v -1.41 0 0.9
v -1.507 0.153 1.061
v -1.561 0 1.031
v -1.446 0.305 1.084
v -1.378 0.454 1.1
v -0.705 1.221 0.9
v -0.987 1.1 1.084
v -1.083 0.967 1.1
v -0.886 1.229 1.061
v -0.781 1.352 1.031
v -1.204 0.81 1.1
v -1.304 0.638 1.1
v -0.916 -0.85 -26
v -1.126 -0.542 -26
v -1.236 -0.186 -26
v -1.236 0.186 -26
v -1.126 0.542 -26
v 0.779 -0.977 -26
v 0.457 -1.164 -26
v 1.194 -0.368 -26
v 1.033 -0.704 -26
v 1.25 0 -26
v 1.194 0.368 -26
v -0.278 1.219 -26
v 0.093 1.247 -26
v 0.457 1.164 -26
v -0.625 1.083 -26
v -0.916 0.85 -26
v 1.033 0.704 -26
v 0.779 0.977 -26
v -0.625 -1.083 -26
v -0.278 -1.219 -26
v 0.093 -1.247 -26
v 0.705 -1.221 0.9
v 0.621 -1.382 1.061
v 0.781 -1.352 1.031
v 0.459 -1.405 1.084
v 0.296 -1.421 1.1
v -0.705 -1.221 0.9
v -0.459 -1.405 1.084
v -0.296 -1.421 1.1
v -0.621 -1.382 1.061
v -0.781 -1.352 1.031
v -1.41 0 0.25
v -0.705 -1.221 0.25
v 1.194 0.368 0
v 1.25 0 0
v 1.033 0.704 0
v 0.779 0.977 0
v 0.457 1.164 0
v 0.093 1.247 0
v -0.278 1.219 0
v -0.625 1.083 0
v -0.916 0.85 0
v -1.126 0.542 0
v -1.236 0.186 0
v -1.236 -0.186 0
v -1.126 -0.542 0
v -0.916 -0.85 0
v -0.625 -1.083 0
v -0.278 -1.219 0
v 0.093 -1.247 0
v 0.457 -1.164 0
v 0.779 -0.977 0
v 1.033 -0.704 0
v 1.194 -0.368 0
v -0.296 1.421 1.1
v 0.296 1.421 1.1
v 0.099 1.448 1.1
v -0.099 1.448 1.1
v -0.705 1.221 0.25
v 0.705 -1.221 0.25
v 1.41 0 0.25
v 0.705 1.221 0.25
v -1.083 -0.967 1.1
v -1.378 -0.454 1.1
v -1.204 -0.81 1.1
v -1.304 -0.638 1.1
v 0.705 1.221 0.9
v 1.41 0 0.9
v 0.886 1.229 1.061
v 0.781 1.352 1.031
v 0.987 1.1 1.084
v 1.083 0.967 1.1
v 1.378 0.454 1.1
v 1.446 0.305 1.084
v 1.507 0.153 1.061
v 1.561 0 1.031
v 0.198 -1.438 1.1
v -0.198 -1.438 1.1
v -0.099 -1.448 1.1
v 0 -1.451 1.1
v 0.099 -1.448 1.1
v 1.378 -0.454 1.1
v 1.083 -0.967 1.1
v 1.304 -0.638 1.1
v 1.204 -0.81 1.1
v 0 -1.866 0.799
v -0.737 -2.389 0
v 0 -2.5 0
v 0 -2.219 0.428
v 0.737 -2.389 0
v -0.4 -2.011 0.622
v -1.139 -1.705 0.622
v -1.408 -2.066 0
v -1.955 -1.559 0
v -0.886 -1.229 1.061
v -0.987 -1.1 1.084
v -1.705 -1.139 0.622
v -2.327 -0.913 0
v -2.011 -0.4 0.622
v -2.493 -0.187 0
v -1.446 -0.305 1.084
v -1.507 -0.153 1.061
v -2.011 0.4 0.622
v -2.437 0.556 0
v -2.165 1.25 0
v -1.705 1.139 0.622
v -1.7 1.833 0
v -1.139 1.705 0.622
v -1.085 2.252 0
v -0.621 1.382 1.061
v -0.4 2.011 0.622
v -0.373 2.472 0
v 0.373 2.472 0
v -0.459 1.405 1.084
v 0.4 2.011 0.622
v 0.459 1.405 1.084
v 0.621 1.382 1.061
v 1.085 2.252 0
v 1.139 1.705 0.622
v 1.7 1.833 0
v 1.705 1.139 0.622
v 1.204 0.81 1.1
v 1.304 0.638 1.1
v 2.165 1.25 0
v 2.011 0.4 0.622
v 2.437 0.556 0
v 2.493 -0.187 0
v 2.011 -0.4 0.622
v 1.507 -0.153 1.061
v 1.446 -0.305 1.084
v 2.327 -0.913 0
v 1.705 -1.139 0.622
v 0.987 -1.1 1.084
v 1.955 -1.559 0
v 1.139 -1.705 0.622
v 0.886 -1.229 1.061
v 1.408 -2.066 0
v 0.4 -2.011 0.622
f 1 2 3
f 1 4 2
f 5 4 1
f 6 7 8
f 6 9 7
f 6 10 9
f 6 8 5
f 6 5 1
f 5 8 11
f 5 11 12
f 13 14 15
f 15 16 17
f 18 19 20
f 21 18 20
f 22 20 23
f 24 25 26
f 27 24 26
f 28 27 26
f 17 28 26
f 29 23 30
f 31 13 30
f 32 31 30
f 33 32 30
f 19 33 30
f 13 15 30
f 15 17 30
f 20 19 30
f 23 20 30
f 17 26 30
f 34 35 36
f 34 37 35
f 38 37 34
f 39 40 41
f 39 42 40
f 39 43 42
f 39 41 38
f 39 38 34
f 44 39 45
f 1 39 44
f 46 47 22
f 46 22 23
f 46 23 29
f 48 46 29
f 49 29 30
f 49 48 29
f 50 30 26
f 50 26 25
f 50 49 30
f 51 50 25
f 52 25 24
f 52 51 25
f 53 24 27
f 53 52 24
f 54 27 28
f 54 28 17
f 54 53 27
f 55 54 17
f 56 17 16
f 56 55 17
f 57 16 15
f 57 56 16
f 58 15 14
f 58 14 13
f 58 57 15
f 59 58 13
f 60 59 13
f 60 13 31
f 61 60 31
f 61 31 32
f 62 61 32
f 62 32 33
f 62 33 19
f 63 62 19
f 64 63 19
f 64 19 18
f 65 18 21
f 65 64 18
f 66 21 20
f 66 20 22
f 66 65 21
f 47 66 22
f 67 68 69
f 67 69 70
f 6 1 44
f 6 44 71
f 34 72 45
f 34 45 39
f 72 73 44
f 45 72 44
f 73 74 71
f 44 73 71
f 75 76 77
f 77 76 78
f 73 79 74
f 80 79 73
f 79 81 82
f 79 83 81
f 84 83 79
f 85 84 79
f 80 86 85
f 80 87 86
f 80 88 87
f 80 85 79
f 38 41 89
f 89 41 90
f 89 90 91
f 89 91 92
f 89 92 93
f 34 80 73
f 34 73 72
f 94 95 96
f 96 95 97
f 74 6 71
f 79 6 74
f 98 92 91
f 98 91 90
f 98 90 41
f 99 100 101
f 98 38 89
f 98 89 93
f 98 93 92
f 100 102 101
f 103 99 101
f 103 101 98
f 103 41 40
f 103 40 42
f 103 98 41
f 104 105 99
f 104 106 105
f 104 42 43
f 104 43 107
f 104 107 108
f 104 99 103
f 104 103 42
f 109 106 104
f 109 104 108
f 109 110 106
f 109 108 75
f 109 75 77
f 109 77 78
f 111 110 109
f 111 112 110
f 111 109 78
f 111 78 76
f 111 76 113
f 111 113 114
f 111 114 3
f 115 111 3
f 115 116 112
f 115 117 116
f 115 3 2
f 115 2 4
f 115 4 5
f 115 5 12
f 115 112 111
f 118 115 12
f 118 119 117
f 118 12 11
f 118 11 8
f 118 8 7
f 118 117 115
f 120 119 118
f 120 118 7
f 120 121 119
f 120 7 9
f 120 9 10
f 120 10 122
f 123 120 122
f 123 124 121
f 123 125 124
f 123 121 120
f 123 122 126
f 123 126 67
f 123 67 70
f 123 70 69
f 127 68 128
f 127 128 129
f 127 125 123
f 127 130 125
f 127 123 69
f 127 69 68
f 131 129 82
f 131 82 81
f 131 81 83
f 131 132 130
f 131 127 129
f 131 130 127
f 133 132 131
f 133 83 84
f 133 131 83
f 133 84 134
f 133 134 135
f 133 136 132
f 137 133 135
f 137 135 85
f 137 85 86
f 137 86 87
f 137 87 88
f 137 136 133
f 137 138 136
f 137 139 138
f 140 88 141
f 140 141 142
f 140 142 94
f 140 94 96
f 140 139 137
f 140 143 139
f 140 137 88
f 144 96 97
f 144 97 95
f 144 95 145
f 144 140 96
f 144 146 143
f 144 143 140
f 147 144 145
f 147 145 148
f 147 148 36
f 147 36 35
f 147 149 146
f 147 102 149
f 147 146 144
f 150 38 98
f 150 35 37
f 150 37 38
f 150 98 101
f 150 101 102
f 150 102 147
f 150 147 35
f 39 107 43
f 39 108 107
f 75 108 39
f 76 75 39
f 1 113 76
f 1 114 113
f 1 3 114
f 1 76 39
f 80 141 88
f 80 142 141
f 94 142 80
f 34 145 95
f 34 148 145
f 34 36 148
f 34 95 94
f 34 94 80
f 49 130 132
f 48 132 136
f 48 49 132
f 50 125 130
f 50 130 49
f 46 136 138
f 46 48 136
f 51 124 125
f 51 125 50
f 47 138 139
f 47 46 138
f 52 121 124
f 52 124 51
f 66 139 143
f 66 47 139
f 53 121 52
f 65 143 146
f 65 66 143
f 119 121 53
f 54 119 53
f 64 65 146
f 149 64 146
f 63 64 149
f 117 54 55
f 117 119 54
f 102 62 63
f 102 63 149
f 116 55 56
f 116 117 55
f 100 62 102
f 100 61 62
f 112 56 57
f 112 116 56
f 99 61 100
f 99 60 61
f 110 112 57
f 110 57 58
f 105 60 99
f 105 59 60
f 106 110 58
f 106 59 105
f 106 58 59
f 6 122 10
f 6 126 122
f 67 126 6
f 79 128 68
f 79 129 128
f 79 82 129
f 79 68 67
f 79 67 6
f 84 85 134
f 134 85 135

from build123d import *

# Parameters (mm, degrees)
SKETCH1_R               = 1.25
BOSS_EXTRUDE1_DEPTH     = 26
CUT_EXTRUDE1_DEPTH      = 1.25
CUT_EXTRUDE2_DEPTH      = 27.239283527
CUT_EXTRUDE2_DEPTH_BACK = 27.239283527
SKETCH6_W               = 1.249656436
SKETCH6_H               = 4.384153796
CHAMFER2_SIZE           = 0.2


with BuildPart() as part:
    # Sketch1 → Boss-Extrude1 (new body)
    with BuildSketch(Plane.XY):
        Circle(SKETCH1_R)
    extrude(amount=-BOSS_EXTRUDE1_DEPTH)

    # Sketch3 → Revolve1 (revolve)
    with BuildSketch(Plane(origin=(0, 0, 0), x_dir=(0, 0, -1), z_dir=(1, 0, 0)), mode=Mode.PRIVATE) as revolve1_sk:
        with BuildLine():
            ThreePointArc((-1.5, 0), (-1.096229956, 1.457737974), (0, 2.5))
            Line((0, 2.5), (0, 0))
            Line((0, 0), (-1.5, 0))
        make_face()
    revolve(revolve1_sk.sketch.rotate(Axis((0, 0, 1.5), (0, 0, -1)), 180), axis=Axis((0, 0, 1.5), (0, 0, -1)))

    # Sketch5 → Cut-Extrude1 (cut)
    with BuildSketch(Plane(origin=(0, 0, 1.5), x_dir=(-1, 0, 0), z_dir=(0, 0, -1))):
        Polygon((-1.409901945, 0), (-0.704950973, -1.221010901), (0.704950973, -1.221010901), (1.409901945, 0), (0.704950973, 1.221010901), (-0.704950973, 1.221010901), align=None)
    extrude(amount=CUT_EXTRUDE1_DEPTH, mode=Mode.SUBTRACT)

    # Sketch6 → Cut-Extrude2 (cut, two sides: drawn at the far end of the back side and taken through both)
    with BuildSketch(Plane(origin=(0, 0, 0), x_dir=(0, 0, -1), z_dir=(1, 0, 0)).offset(-CUT_EXTRUDE2_DEPTH_BACK)):
        with Locations((-1.724828218, 0.205450463)):
            Rectangle(SKETCH6_W, SKETCH6_H)
    extrude(amount=CUT_EXTRUDE2_DEPTH + CUT_EXTRUDE2_DEPTH_BACK, mode=Mode.SUBTRACT)

    # Chamfer2
    # the kernel refuses this chamfer: 0.2 mm, written as the material it takes off along each edge
    with BuildSketch(Plane(origin=(1.21928757, 1.221010901, 1.1), x_dir=(1.0390370186618431e-14, 0.9996219169112966, 0.02749587661058733), z_dir=(-1, 0, 0))) as chamfer2_piece_1_section:
        Polygon((CHAMFER2_SIZE * 0.999621916911, CHAMFER2_SIZE * 0.0274958766106), (-CHAMFER2_SIZE * 0.0274958766106, CHAMFER2_SIZE * 0.999621916911), (0, 0), align=None)
    chamfer2_piece_1 = extrude(amount=2.43857514, mode=Mode.PRIVATE)
    chamfer2_piece_1 = split(chamfer2_piece_1, bisect_by=Plane(origin=(0.501104512, 1.574083329, 1.032865614), z_dir=(-0.8660254037844416, -0.49999999999999495, 0)), keep=Keep.TOP, mode=Mode.PRIVATE)
    chamfer2_piece_1 = split(chamfer2_piece_1, bisect_by=Plane(origin=(-0.501104512, 1.574083329, 1.032865614), z_dir=(0.8660254037844347, -0.500000000000007, 0)), keep=Keep.TOP, mode=Mode.PRIVATE)
    add(chamfer2_piece_1, mode=Mode.SUBTRACT)
    with BuildSketch(Plane(origin=(1.667070244, -0.44542856, 1.1), x_dir=(0.8656979742248833, 0.4998109584556433, 0.027495876610586282), z_dir=(-0.49999999999999495, 0.8660254037844416, 0))) as chamfer2_piece_2_section:
        Polygon((CHAMFER2_SIZE * 0.999621916911, CHAMFER2_SIZE * 0.0274958766106), (-CHAMFER2_SIZE * 0.0274958766106, CHAMFER2_SIZE * 0.999621916911), (0, 0), align=None)
    chamfer2_piece_2 = extrude(amount=2.43857514, mode=Mode.PRIVATE)
    chamfer2_piece_2 = split(chamfer2_piece_2, bisect_by=Plane(origin=(1.613748406, 0.353072427, 1.032865614), z_dir=(-0.8660254037844382, 0.500000000000001, 0)), keep=Keep.TOP, mode=Mode.PRIVATE)
    chamfer2_piece_2 = split(chamfer2_piece_2, bisect_by=Plane(origin=(1.112643894, 1.221010901, 1.032865614), z_dir=(0, -1, 0)), keep=Keep.TOP, mode=Mode.PRIVATE)
    add(chamfer2_piece_2, mode=Mode.SUBTRACT)
    with BuildSketch(Plane(origin=(0.447782674, -1.666439461, 1.1), x_dir=(0.8656979742248797, -0.4998109584556493, 0.02749587661058626), z_dir=(0.500000000000001, 0.8660254037844382, 0))) as chamfer2_piece_3_section:
        Polygon((CHAMFER2_SIZE * 0.999621916911, CHAMFER2_SIZE * 0.0274958766106), (-CHAMFER2_SIZE * 0.0274958766106, CHAMFER2_SIZE * 0.999621916911), (0, 0), align=None)
    chamfer2_piece_3 = extrude(amount=2.43857514, mode=Mode.PRIVATE)
    chamfer2_piece_3 = split(chamfer2_piece_3, bisect_by=Plane(origin=(1.112643894, -1.221010901, 1.032865614), z_dir=(0, 1, 0)), keep=Keep.TOP, mode=Mode.PRIVATE)
    chamfer2_piece_3 = split(chamfer2_piece_3, bisect_by=Plane(origin=(1.613748406, -0.353072427, 1.032865614), z_dir=(-0.8660254037844416, -0.49999999999999495, 0)), keep=Keep.TOP, mode=Mode.PRIVATE)
    add(chamfer2_piece_3, mode=Mode.SUBTRACT)
    with BuildSketch(Plane(origin=(-1.21928757, -1.221010901, 1.1), x_dir=(-3.30602687756041e-15, -0.9996219169112968, 0.027495876610586285), z_dir=(1, 0, 0))) as chamfer2_piece_4_section:
        Polygon((CHAMFER2_SIZE * 0.999621916911, CHAMFER2_SIZE * 0.0274958766106), (-CHAMFER2_SIZE * 0.0274958766106, CHAMFER2_SIZE * 0.999621916911), (0, 0), align=None)
    chamfer2_piece_4 = extrude(amount=2.43857514, mode=Mode.PRIVATE)
    chamfer2_piece_4 = split(chamfer2_piece_4, bisect_by=Plane(origin=(-0.501104512, -1.574083329, 1.032865614), z_dir=(0.8660254037844417, 0.49999999999999484, 0)), keep=Keep.TOP, mode=Mode.PRIVATE)
    chamfer2_piece_4 = split(chamfer2_piece_4, bisect_by=Plane(origin=(0.501104512, -1.574083329, 1.032865614), z_dir=(-0.8660254037844382, 0.500000000000001, 0)), keep=Keep.TOP, mode=Mode.PRIVATE)
    add(chamfer2_piece_4, mode=Mode.SUBTRACT)
    with BuildSketch(Plane(origin=(-1.667070244, 0.44542856, 1.1), x_dir=(-0.8656979742248834, -0.4998109584556432, 0.027495876610586265), z_dir=(0.49999999999999484, -0.8660254037844417, 0))) as chamfer2_piece_5_section:
        Polygon((CHAMFER2_SIZE * 0.999621916911, CHAMFER2_SIZE * 0.0274958766106), (-CHAMFER2_SIZE * 0.0274958766106, CHAMFER2_SIZE * 0.999621916911), (0, 0), align=None)
    chamfer2_piece_5 = extrude(amount=2.43857514, mode=Mode.PRIVATE)
    chamfer2_piece_5 = split(chamfer2_piece_5, bisect_by=Plane(origin=(-1.112643894, -1.221010901, 1.032865614), z_dir=(0, 1, 0)), keep=Keep.TOP, mode=Mode.PRIVATE)
    chamfer2_piece_5 = split(chamfer2_piece_5, bisect_by=Plane(origin=(-1.613748406, -0.353072427, 1.032865614), z_dir=(0.8660254037844347, -0.500000000000007, 0)), keep=Keep.TOP, mode=Mode.PRIVATE)
    add(chamfer2_piece_5, mode=Mode.SUBTRACT)
    with BuildSketch(Plane(origin=(-0.447782674, 1.666439461, 1.1), x_dir=(-0.8656979742248764, 0.4998109584556554, 0.027495876610586265), z_dir=(-0.500000000000007, -0.8660254037844347, 0))) as chamfer2_piece_6_section:
        Polygon((CHAMFER2_SIZE * 0.999621916911, CHAMFER2_SIZE * 0.0274958766106), (-CHAMFER2_SIZE * 0.0274958766106, CHAMFER2_SIZE * 0.999621916911), (0, 0), align=None)
    chamfer2_piece_6 = extrude(amount=2.43857514, mode=Mode.PRIVATE)
    chamfer2_piece_6 = split(chamfer2_piece_6, bisect_by=Plane(origin=(-1.112643894, 1.221010901, 1.032865614), z_dir=(0, -1, 0)), keep=Keep.TOP, mode=Mode.PRIVATE)
    chamfer2_piece_6 = split(chamfer2_piece_6, bisect_by=Plane(origin=(-1.613748406, 0.353072427, 1.032865614), z_dir=(0.8660254037844417, 0.49999999999999484, 0)), keep=Keep.TOP, mode=Mode.PRIVATE)
    add(chamfer2_piece_6, mode=Mode.SUBTRACT)
    with BuildSketch(Plane(origin=(1.667070244, -0.44542856, 1.1), x_dir=(0.8656979742248833, 0.4998109584556433, 0.027495876610586282), z_dir=(-0.49999999999999495, 0.8660254037844416, 0))) as chamfer2_piece_7a_section:
        Polygon((CHAMFER2_SIZE * 0.999621916911, CHAMFER2_SIZE * 0.0274958766106), (-CHAMFER2_SIZE * 0.0274958766106, CHAMFER2_SIZE * 0.999621916911), (0, 0), align=None)
    chamfer2_piece_7a = extrude(amount=2.43857514, mode=Mode.PRIVATE)
    chamfer2_piece_7a = split(chamfer2_piece_7a, bisect_by=Plane(origin=(0.645691333, 1.221010901, 1.035460513), z_dir=(0, 1, 0)), keep=Keep.TOP, mode=Mode.PRIVATE)
    with BuildSketch(Plane(origin=(1.21928757, 1.221010901, 1.1), x_dir=(1.0390370186618431e-14, 0.9996219169112966, 0.02749587661058733), z_dir=(-1, 0, 0))) as chamfer2_piece_7b_section:
        Polygon((CHAMFER2_SIZE * 0.999621916911, CHAMFER2_SIZE * 0.0274958766106), (-CHAMFER2_SIZE * 0.0274958766106, CHAMFER2_SIZE * 0.999621916911), (0, 0), align=None)
    chamfer2_piece_7b = extrude(amount=2.43857514, mode=Mode.PRIVATE)
    chamfer2_piece_7b = split(chamfer2_piece_7b, bisect_by=Plane(origin=(0.734580793, 1.169690548, 1.035460513), z_dir=(0.8660254037844416, 0.49999999999999495, 0)), keep=Keep.TOP, mode=Mode.PRIVATE)
    chamfer2_piece_7 = chamfer2_piece_7a & chamfer2_piece_7b
    add(chamfer2_piece_7, mode=Mode.SUBTRACT)
    with BuildSketch(Plane(origin=(1.21928757, 1.221010901, 1.1), x_dir=(1.0390370186618431e-14, 0.9996219169112966, 0.02749587661058733), z_dir=(-1, 0, 0))) as chamfer2_piece_8a_section:
        Polygon((CHAMFER2_SIZE * 0.999621916911, CHAMFER2_SIZE * 0.0274958766106), (-CHAMFER2_SIZE * 0.0274958766106, CHAMFER2_SIZE * 0.999621916911), (0, 0), align=None)
    chamfer2_piece_8a = extrude(amount=2.43857514, mode=Mode.PRIVATE)
    chamfer2_piece_8a = split(chamfer2_piece_8a, bisect_by=Plane(origin=(-0.734580793, 1.169690548, 1.035460513), z_dir=(-0.8660254037844347, 0.500000000000007, 0)), keep=Keep.TOP, mode=Mode.PRIVATE)
    with BuildSketch(Plane(origin=(-0.447782674, 1.666439461, 1.1), x_dir=(-0.8656979742248764, 0.4998109584556554, 0.027495876610586265), z_dir=(-0.500000000000007, -0.8660254037844347, 0))) as chamfer2_piece_8b_section:
        Polygon((CHAMFER2_SIZE * 0.999621916911, CHAMFER2_SIZE * 0.0274958766106), (-CHAMFER2_SIZE * 0.0274958766106, CHAMFER2_SIZE * 0.999621916911), (0, 0), align=None)
    chamfer2_piece_8b = extrude(amount=2.43857514, mode=Mode.PRIVATE)
    chamfer2_piece_8b = split(chamfer2_piece_8b, bisect_by=Plane(origin=(-0.645691333, 1.221010901, 1.035460513), z_dir=(0, 1, 0)), keep=Keep.TOP, mode=Mode.PRIVATE)
    chamfer2_piece_8 = chamfer2_piece_8a & chamfer2_piece_8b
    add(chamfer2_piece_8, mode=Mode.SUBTRACT)
    with BuildSketch(Plane(origin=(0.447782674, -1.666439461, 1.1), x_dir=(0.8656979742248797, -0.4998109584556493, 0.02749587661058626), z_dir=(0.500000000000001, 0.8660254037844382, 0))) as chamfer2_piece_9a_section:
        Polygon((CHAMFER2_SIZE * 0.999621916911, CHAMFER2_SIZE * 0.0274958766106), (-CHAMFER2_SIZE * 0.0274958766106, CHAMFER2_SIZE * 0.999621916911), (0, 0), align=None)
    chamfer2_piece_9a = extrude(amount=2.43857514, mode=Mode.PRIVATE)
    chamfer2_piece_9a = split(chamfer2_piece_9a, bisect_by=Plane(origin=(1.380272125, 0.051320354, 1.035460513), z_dir=(0.8660254037844416, 0.49999999999999495, 0)), keep=Keep.TOP, mode=Mode.PRIVATE)
    with BuildSketch(Plane(origin=(1.667070244, -0.44542856, 1.1), x_dir=(0.8656979742248833, 0.4998109584556433, 0.027495876610586282), z_dir=(-0.49999999999999495, 0.8660254037844416, 0))) as chamfer2_piece_9b_section:
        Polygon((CHAMFER2_SIZE * 0.999621916911, CHAMFER2_SIZE * 0.0274958766106), (-CHAMFER2_SIZE * 0.0274958766106, CHAMFER2_SIZE * 0.999621916911), (0, 0), align=None)
    chamfer2_piece_9b = extrude(amount=2.43857514, mode=Mode.PRIVATE)
    chamfer2_piece_9b = split(chamfer2_piece_9b, bisect_by=Plane(origin=(1.380272125, -0.051320354, 1.035460513), z_dir=(0.8660254037844382, -0.500000000000001, 0)), keep=Keep.TOP, mode=Mode.PRIVATE)
    chamfer2_piece_9 = chamfer2_piece_9a & chamfer2_piece_9b
    add(chamfer2_piece_9, mode=Mode.SUBTRACT)
    with BuildSketch(Plane(origin=(-1.21928757, -1.221010901, 1.1), x_dir=(-3.30602687756041e-15, -0.9996219169112968, 0.027495876610586285), z_dir=(1, 0, 0))) as chamfer2_piece_10a_section:
        Polygon((CHAMFER2_SIZE * 0.999621916911, CHAMFER2_SIZE * 0.0274958766106), (-CHAMFER2_SIZE * 0.0274958766106, CHAMFER2_SIZE * 0.999621916911), (0, 0), align=None)
    chamfer2_piece_10a = extrude(amount=2.43857514, mode=Mode.PRIVATE)
    chamfer2_piece_10a = split(chamfer2_piece_10a, bisect_by=Plane(origin=(0.734580793, -1.169690548, 1.035460513), z_dir=(0.8660254037844382, -0.500000000000001, 0)), keep=Keep.TOP, mode=Mode.PRIVATE)
    with BuildSketch(Plane(origin=(0.447782674, -1.666439461, 1.1), x_dir=(0.8656979742248797, -0.4998109584556493, 0.02749587661058626), z_dir=(0.500000000000001, 0.8660254037844382, 0))) as chamfer2_piece_10b_section:
        Polygon((CHAMFER2_SIZE * 0.999621916911, CHAMFER2_SIZE * 0.0274958766106), (-CHAMFER2_SIZE * 0.0274958766106, CHAMFER2_SIZE * 0.999621916911), (0, 0), align=None)
    chamfer2_piece_10b = extrude(amount=2.43857514, mode=Mode.PRIVATE)
    chamfer2_piece_10b = split(chamfer2_piece_10b, bisect_by=Plane(origin=(0.645691333, -1.221010901, 1.035460513), z_dir=(0, -1, 0)), keep=Keep.TOP, mode=Mode.PRIVATE)
    chamfer2_piece_10 = chamfer2_piece_10a & chamfer2_piece_10b
    add(chamfer2_piece_10, mode=Mode.SUBTRACT)
    with BuildSketch(Plane(origin=(-1.21928757, -1.221010901, 1.1), x_dir=(-3.30602687756041e-15, -0.9996219169112968, 0.027495876610586285), z_dir=(1, 0, 0))) as chamfer2_piece_11a_section:
        Polygon((CHAMFER2_SIZE * 0.999621916911, CHAMFER2_SIZE * 0.0274958766106), (-CHAMFER2_SIZE * 0.0274958766106, CHAMFER2_SIZE * 0.999621916911), (0, 0), align=None)
    chamfer2_piece_11a = extrude(amount=2.43857514, mode=Mode.PRIVATE)
    chamfer2_piece_11a = split(chamfer2_piece_11a, bisect_by=Plane(origin=(-0.734580793, -1.169690548, 1.035460513), z_dir=(-0.8660254037844417, -0.49999999999999484, 0)), keep=Keep.TOP, mode=Mode.PRIVATE)
    with BuildSketch(Plane(origin=(-1.667070244, 0.44542856, 1.1), x_dir=(-0.8656979742248834, -0.4998109584556432, 0.027495876610586265), z_dir=(0.49999999999999484, -0.8660254037844417, 0))) as chamfer2_piece_11b_section:
        Polygon((CHAMFER2_SIZE * 0.999621916911, CHAMFER2_SIZE * 0.0274958766106), (-CHAMFER2_SIZE * 0.0274958766106, CHAMFER2_SIZE * 0.999621916911), (0, 0), align=None)
    chamfer2_piece_11b = extrude(amount=2.43857514, mode=Mode.PRIVATE)
    chamfer2_piece_11b = split(chamfer2_piece_11b, bisect_by=Plane(origin=(-0.645691333, -1.221010901, 1.035460513), z_dir=(0, -1, 0)), keep=Keep.TOP, mode=Mode.PRIVATE)
    chamfer2_piece_11 = chamfer2_piece_11a & chamfer2_piece_11b
    add(chamfer2_piece_11, mode=Mode.SUBTRACT)
    with BuildSketch(Plane(origin=(-0.447782674, 1.666439461, 1.1), x_dir=(-0.8656979742248764, 0.4998109584556554, 0.027495876610586265), z_dir=(-0.500000000000007, -0.8660254037844347, 0))) as chamfer2_piece_12a_section:
        Polygon((CHAMFER2_SIZE * 0.999621916911, CHAMFER2_SIZE * 0.0274958766106), (-CHAMFER2_SIZE * 0.0274958766106, CHAMFER2_SIZE * 0.999621916911), (0, 0), align=None)
    chamfer2_piece_12a = extrude(amount=2.43857514, mode=Mode.PRIVATE)
    chamfer2_piece_12a = split(chamfer2_piece_12a, bisect_by=Plane(origin=(-1.380272125, -0.051320354, 1.035460513), z_dir=(-0.8660254037844417, -0.49999999999999484, 0)), keep=Keep.TOP, mode=Mode.PRIVATE)
    with BuildSketch(Plane(origin=(-1.667070244, 0.44542856, 1.1), x_dir=(-0.8656979742248834, -0.4998109584556432, 0.027495876610586265), z_dir=(0.49999999999999484, -0.8660254037844417, 0))) as chamfer2_piece_12b_section:
        Polygon((CHAMFER2_SIZE * 0.999621916911, CHAMFER2_SIZE * 0.0274958766106), (-CHAMFER2_SIZE * 0.0274958766106, CHAMFER2_SIZE * 0.999621916911), (0, 0), align=None)
    chamfer2_piece_12b = extrude(amount=2.43857514, mode=Mode.PRIVATE)
    chamfer2_piece_12b = split(chamfer2_piece_12b, bisect_by=Plane(origin=(-1.380272125, 0.051320354, 1.035460513), z_dir=(-0.8660254037844347, 0.500000000000007, 0)), keep=Keep.TOP, mode=Mode.PRIVATE)
    chamfer2_piece_12 = chamfer2_piece_12a & chamfer2_piece_12b
    add(chamfer2_piece_12, mode=Mode.SUBTRACT)


solid = part.part
